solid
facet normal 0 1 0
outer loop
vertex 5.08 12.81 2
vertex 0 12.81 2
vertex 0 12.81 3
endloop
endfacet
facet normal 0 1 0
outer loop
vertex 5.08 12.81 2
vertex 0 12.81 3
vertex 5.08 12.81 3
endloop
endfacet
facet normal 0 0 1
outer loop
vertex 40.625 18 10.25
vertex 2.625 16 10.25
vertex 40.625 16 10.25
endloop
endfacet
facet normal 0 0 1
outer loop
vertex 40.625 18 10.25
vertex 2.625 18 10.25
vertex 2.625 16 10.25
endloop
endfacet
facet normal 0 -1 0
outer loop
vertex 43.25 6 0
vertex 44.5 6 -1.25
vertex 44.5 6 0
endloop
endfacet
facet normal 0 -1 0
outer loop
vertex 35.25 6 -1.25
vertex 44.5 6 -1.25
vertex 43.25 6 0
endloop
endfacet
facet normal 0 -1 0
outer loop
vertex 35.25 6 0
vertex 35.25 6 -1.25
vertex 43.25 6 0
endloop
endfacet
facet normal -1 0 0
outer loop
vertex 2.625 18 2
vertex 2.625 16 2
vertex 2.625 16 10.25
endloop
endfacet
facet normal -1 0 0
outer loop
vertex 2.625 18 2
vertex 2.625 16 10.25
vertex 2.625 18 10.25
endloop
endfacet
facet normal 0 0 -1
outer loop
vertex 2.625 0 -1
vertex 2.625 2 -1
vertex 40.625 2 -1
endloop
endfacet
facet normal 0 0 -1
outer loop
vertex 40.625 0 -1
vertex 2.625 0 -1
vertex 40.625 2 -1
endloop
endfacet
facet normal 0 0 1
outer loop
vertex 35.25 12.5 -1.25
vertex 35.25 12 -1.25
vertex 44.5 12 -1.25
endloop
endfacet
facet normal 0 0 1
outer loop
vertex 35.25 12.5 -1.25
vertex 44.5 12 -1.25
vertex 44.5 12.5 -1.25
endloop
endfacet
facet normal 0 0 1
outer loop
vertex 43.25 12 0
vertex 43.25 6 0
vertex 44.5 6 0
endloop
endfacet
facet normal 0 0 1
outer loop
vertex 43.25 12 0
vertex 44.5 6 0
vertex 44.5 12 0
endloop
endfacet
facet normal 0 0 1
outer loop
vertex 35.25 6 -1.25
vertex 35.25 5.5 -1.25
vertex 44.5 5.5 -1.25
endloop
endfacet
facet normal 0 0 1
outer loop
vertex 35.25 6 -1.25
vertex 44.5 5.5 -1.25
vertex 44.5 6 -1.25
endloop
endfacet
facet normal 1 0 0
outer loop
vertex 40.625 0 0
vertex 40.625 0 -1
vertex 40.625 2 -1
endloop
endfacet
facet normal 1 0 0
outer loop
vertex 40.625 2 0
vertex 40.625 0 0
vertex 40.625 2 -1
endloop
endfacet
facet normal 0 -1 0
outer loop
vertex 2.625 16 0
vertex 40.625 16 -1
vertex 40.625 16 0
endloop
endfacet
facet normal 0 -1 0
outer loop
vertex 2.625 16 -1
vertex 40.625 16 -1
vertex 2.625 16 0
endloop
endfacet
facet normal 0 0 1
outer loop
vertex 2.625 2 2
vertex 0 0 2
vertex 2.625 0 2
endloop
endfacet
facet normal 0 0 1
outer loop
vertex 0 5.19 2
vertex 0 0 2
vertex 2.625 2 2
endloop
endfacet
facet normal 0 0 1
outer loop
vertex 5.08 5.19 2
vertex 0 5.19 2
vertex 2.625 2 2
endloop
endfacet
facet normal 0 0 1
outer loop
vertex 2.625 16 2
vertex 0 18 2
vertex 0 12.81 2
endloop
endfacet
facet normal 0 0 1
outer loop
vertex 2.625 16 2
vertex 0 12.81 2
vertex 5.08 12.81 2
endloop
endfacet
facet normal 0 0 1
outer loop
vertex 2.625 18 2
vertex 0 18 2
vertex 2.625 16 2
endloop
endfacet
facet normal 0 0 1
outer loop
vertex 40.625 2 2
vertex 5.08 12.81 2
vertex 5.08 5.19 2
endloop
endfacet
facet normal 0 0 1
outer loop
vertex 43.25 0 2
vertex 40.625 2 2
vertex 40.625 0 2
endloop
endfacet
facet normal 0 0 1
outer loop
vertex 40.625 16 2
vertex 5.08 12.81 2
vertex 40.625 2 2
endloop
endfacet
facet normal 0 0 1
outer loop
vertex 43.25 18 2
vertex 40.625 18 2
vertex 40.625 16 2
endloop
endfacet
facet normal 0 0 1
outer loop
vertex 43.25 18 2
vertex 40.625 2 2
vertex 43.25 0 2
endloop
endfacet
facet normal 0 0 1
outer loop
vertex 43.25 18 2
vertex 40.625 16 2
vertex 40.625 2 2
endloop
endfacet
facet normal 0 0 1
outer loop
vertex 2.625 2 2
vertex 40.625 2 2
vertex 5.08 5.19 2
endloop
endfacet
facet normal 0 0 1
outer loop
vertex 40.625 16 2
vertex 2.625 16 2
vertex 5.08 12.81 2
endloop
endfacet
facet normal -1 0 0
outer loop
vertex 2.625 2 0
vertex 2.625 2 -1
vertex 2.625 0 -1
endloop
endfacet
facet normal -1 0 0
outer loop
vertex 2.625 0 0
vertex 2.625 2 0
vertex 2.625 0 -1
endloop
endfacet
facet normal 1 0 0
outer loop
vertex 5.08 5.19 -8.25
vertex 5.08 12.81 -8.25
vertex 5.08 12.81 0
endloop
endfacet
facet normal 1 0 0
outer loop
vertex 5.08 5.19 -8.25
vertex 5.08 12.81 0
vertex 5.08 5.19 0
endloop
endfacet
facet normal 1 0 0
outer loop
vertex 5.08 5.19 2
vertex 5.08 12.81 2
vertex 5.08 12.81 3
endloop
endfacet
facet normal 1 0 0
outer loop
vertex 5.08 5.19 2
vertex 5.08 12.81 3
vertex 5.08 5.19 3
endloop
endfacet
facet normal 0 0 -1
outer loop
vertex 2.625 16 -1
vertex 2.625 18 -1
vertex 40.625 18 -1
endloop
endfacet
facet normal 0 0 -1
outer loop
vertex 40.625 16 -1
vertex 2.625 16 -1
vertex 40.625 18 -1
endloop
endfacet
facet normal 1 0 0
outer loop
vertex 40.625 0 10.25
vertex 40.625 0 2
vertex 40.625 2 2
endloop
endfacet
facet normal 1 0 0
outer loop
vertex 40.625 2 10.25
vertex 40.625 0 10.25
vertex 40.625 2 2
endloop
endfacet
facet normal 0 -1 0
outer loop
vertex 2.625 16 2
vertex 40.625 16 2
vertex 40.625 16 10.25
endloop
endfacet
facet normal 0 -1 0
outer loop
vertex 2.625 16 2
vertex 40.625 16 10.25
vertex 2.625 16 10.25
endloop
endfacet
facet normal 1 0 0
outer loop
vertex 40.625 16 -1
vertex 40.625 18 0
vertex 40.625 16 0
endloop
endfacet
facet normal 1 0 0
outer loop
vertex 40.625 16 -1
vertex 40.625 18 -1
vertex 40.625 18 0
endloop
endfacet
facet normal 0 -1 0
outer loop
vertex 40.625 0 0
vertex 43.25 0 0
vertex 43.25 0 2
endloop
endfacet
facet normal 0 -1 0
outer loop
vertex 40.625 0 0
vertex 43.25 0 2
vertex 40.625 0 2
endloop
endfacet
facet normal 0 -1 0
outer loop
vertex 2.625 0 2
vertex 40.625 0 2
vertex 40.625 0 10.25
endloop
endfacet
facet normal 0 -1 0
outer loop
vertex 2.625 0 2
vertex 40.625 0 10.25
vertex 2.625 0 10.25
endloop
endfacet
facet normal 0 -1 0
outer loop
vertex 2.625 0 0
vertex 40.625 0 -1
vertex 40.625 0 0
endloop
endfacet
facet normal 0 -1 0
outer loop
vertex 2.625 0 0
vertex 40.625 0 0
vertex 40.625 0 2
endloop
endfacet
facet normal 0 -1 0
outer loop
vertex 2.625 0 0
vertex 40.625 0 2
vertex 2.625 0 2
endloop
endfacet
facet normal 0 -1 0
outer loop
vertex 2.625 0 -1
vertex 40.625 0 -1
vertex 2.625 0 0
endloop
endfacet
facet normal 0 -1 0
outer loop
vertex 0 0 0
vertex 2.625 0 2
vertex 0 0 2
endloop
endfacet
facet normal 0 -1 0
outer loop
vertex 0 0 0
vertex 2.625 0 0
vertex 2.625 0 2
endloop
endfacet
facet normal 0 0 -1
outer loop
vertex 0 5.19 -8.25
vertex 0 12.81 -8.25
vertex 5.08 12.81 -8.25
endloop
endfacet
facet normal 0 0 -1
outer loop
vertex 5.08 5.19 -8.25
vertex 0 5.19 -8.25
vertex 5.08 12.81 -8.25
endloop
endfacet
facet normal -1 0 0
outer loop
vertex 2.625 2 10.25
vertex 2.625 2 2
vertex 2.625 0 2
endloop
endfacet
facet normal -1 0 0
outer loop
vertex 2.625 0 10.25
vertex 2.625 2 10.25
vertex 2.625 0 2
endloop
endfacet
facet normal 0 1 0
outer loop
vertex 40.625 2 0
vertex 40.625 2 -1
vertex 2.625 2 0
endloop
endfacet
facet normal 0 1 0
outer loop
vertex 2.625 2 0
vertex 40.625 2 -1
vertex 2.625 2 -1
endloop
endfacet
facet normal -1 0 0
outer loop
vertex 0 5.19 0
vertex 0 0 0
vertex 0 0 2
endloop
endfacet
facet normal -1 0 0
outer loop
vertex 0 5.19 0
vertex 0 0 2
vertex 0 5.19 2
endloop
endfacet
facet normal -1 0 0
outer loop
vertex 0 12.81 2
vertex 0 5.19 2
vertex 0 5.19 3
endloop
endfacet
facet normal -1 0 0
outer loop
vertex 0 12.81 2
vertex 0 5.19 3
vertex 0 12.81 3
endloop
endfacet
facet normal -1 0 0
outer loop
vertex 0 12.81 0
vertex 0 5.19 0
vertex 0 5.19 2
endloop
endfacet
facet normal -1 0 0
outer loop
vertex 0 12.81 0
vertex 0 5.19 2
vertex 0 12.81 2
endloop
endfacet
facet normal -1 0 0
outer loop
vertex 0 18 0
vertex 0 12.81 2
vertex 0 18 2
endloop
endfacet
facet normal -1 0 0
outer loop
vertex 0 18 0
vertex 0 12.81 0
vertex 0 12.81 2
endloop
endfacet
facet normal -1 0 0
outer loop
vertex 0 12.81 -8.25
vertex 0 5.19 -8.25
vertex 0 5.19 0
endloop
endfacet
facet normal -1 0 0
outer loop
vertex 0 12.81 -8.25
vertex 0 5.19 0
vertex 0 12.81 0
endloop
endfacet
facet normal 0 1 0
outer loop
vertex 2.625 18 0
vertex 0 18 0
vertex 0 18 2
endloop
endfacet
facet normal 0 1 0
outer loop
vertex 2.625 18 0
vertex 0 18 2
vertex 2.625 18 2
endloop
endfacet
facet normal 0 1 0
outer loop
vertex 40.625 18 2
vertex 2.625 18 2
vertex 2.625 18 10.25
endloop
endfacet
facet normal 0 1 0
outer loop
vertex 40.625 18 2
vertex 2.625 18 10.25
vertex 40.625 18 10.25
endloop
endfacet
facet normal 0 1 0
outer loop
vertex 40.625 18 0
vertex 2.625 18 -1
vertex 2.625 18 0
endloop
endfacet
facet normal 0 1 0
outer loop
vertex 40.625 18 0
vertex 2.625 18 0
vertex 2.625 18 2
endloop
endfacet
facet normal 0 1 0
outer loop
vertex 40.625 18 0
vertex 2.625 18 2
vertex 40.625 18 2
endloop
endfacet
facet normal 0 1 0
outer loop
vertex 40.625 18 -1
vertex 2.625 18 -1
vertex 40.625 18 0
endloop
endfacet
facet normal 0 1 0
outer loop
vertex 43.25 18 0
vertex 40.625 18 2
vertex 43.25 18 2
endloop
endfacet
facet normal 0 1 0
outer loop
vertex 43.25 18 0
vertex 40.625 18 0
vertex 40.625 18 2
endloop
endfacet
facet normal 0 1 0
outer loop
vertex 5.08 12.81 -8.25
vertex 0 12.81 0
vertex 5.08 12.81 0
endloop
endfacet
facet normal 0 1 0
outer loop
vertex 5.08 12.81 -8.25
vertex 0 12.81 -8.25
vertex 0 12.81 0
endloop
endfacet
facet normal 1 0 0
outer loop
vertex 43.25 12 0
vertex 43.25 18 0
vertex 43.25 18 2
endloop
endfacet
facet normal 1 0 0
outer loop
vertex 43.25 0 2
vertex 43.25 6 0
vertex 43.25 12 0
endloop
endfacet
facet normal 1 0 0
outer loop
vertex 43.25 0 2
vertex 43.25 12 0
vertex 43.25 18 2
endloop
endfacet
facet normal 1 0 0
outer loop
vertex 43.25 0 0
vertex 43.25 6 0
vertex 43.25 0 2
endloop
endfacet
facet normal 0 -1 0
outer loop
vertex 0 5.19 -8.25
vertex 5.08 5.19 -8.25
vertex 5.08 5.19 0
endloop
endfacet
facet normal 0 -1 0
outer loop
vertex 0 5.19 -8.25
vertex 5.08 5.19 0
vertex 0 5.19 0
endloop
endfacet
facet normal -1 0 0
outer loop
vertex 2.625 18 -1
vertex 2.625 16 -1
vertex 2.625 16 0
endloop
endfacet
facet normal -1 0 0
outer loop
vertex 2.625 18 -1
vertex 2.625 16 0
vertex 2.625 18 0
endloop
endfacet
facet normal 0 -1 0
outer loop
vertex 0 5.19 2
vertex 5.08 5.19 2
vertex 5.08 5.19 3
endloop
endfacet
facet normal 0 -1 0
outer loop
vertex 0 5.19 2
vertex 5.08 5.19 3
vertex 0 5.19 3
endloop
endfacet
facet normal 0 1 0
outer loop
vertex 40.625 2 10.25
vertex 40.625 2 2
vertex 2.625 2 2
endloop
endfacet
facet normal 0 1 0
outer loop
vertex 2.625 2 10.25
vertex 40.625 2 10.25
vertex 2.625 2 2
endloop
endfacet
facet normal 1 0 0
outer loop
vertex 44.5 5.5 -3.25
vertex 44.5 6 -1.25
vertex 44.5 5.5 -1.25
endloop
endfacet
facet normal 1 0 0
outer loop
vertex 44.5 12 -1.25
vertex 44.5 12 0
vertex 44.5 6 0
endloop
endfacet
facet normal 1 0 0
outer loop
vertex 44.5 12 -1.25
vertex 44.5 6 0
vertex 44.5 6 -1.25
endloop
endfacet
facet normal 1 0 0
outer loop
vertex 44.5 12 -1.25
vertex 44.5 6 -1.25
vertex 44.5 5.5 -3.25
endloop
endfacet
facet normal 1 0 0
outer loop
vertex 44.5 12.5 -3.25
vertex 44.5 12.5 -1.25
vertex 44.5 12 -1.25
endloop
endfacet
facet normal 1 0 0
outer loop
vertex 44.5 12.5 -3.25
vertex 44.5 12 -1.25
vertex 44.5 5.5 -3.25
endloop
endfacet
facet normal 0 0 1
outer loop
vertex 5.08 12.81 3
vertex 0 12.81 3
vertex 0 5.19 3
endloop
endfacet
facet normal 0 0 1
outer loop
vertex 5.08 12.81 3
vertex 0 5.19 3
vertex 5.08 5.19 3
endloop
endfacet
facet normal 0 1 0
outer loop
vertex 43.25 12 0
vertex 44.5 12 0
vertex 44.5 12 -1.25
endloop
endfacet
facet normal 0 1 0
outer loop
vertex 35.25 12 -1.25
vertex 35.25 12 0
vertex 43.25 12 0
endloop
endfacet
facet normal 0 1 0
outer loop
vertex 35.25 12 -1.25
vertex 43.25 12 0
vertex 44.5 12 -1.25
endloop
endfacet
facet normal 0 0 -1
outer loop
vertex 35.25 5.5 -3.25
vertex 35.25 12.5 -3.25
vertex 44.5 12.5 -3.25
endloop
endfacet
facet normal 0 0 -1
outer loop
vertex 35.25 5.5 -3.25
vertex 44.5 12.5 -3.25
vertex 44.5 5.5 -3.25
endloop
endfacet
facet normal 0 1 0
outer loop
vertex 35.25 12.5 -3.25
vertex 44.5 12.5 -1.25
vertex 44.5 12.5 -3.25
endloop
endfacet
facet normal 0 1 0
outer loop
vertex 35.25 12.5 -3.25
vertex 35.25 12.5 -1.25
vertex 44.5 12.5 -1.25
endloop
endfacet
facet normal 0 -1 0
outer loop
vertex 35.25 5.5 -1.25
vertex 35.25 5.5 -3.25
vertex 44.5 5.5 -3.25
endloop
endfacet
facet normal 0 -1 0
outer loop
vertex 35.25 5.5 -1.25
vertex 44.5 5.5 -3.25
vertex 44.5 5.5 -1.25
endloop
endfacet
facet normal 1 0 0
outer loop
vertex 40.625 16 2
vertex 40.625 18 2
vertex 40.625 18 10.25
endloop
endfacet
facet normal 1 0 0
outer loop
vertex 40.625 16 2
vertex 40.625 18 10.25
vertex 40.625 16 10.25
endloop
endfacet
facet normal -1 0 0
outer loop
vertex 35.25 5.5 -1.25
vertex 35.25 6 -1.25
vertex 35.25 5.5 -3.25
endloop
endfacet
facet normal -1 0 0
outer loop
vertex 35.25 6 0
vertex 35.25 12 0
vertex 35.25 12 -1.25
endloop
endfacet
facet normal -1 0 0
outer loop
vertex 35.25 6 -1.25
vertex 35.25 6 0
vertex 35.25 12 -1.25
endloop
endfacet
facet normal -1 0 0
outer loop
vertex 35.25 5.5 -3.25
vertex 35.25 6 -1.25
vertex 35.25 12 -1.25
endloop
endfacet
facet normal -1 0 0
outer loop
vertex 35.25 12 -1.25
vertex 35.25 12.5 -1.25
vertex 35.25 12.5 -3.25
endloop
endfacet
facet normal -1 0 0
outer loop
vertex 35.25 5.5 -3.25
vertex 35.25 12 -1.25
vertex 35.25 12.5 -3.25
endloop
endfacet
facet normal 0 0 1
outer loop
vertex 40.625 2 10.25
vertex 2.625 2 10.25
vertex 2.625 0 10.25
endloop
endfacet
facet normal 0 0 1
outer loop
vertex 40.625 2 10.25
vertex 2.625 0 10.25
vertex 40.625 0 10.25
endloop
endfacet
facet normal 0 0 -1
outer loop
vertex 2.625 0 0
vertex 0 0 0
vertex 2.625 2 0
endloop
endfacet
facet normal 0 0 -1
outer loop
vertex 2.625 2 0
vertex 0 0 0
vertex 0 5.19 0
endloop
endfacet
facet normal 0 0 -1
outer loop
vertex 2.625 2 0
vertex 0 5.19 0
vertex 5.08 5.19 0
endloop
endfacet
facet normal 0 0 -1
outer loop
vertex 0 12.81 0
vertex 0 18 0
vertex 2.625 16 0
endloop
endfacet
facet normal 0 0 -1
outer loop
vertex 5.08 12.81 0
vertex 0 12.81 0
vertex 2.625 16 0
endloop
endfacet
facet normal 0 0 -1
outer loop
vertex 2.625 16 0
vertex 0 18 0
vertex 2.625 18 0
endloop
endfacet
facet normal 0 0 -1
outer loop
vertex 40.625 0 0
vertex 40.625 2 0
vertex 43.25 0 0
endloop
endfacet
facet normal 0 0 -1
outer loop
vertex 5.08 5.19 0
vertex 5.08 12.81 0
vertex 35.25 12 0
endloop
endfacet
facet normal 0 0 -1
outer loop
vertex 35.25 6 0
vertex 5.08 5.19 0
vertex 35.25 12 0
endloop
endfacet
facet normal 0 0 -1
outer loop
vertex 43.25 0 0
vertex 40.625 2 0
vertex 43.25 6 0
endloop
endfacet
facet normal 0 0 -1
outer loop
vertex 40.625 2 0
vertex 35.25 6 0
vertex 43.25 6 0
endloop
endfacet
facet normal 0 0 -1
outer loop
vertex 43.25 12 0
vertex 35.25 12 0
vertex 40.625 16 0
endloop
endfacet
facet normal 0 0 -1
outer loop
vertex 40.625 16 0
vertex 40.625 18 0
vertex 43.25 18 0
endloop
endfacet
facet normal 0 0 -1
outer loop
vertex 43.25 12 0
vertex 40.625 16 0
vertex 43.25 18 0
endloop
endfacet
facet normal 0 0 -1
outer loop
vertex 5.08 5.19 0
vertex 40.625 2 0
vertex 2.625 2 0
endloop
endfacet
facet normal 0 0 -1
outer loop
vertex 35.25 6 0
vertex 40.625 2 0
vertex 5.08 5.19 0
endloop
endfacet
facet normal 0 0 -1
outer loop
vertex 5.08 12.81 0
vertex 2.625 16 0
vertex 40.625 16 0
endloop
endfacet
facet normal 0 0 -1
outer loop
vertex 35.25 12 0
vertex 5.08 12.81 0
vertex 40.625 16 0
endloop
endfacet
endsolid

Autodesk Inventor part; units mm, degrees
ref_plane "YZ Plane" through (0, 0, 0) normal (1, 0, 0) x (0, 1, 0)
ref_plane "XZ Plane" through (0, 0, 0) normal (0, 1, 0) x (-1, 0, 0)
ref_plane "XY Plane" through (0, 0, 0) normal (0, 0, 1) x (1, 0, 0)
sketch "Sketch1" plane through (0, 0, 0) normal (0, 0, 1) x (1, 0, 0)
  line L0 (0, 18) -> (43.25, 18)
  line L1 (43.25, 18) -> (43.25, 0)
  line L2 (43.25, 0) -> (0, 0)
  line L3 (0, 0) -> (0, 9)
  line L4 (0, 12.81) -> (5.08, 12.81)
  line L5 (5.08, 12.81) -> (5.08, 5.19)
  line L6 (5.08, 5.19) -> (0, 5.19)
  line L7 (0, 5.19) -> (0, 9)
  line L8 (0, 9) -> (43.25, 9) construction
  line L9 (0, 9) -> (0, 18)
  line L10 (0, 9) -> (0, 12.81)
  dimension "d0" = 43.25
  dimension "d1" = 18
  dimension "d3" = 7.62
  dimension "d4" = 5.08
extrude "Extrusion1" add sketch "Sketch1" along normal blind 2 contours L0 L1 L2 L3 L6 L5 L4 L9
extrude "Extrusion2" add sketch "Sketch1" along normal blind 3 and the other way blind 8.25 contours L4 L5 L6 L3 L9
sketch "Sketch2" plane through (43.25, 0, 0) normal (1, 0, 0) x (0, 0, -1)
  line L0 (0, 12) -> (1.25, 12)
  line L1 (1.25, 6) -> (0, 6)
  line L2 (0, 6) -> (0, 9)
  line L3 (3.25, 5.5) -> (1.25, 5.5)
  line L4 (1.25, 5.5) -> (1.25, 6)
  line L5 (1.25, 12.5) -> (3.25, 12.5)
  line L6 (3.25, 12.5) -> (3.25, 5.5)
  line L7 (0, 9) -> (3.25, 9) construction
  line L8 (0, 9) -> (0, 12)
  line L9 (1.25, 9) -> (1.25, 12) construction
  line L10 (1.25, 12) -> (1.25, 12.5)
  line L11 (1.25, 6) -> (1.25, 9) construction
  line L12 (0, 18) -> (0, 0) projected
  line L13 (0, 0) -> (0, 18) projected
  point P0 (0, 12.81)
  point P1 (0, 5.19)
  point P2 (0, 9)
  point P3 (0, 9)
  dimension "d9" = 6
  dimension "d10" = 1.25
  dimension "d12" = 7
  dimension "d13" = 2
extrude "Extrusion3" add sketch "Sketch2" along normal blind 1.25 and the other way blind 8
sketch "Sketch3" plane through (0, 0, 2) normal (0, 0, 1) x (1, 0, 0)
  line L0 (2.625, 18) -> (40.625, 18)
  line L1 (40.625, 18) -> (40.625, 16)
  line L2 (40.625, 16) -> (2.625, 16)
  line L3 (2.625, 16) -> (2.625, 18)
  line L4 (0, 18) -> (0, 12.81) projected
  line L5 (2.625, 17) -> (0, 18) construction
  line L6 (40.625, 17) -> (43.25, 18) construction
  line L7 (43.25, 0) -> (43.25, 18) projected
  line L8 (43.25, 9) -> (0, 9) construction
  line L9 (0, 5.19) -> (0, 12.81) projected
  line L10 (2.625, 0) -> (40.625, 0)
  line L11 (40.625, 0) -> (40.625, 2)
  line L12 (40.625, 2) -> (2.625, 2)
  line L13 (2.625, 2) -> (2.625, 0)
  point P0 (0, 0)
  dimension "d20" = 38
  dimension "d21" = 2
extrude "Extrusion4" add sketch "Sketch3" along normal blind 8.25 and the other way blind 3
properties part number "NANO"
